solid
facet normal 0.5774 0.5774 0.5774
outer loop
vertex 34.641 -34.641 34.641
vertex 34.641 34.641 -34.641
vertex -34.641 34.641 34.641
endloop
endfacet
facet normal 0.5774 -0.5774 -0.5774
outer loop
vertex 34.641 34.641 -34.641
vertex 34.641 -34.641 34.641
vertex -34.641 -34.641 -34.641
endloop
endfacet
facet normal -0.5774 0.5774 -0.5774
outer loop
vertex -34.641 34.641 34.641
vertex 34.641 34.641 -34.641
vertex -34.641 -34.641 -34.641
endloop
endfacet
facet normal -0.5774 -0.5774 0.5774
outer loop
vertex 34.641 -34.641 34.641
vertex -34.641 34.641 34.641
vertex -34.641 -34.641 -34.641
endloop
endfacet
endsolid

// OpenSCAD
/*
  
   cubic system forms
   
   see http://kitwallace.tumblr.com/tagged/crystal 
   
   Kit Wallace October 2015
   
   doesnt work in Thiniverse customiser - preview is very small 
   
*/

form=5; // [0:cube,1:rhombic dodecahedron,2:tetrahexahedron,3:pentagonal dodecahedron,4:octahedron,5:tetrahedron,6:icositetrahedron,7:triakis tetrahedron,8:triakis octahedron,9:deltoid dodecahedron,10:hexakis octahedron,11:diakisdodecahedron,12:hexatetrahedron,13:pentagonal icositetrahedron,14:tetrahedral pentagonal dodecaheron]



/* [orientation] */
//experimentation needed since size varies with form
size=20; // [1:40] 

// basic functions

function flatten(l) = [ for (a = l) for (b = a) b ] ;

function vcontains(val,list) =
     search([val],list)[0] != [];
       
function distinct(list,dlist=[],i=0) =  // return only distinct items of list
      i==len(list)
         ? dlist
         : vcontains(list[i],dlist)
             ? distinct(list,dlist,i+1)
             : distinct(list,concat(dlist,[list[i]]),i+1)
      ;

function sum(list,i=0) =  
      i < len(list)
        ?  list[i] + sum(list,i+1)
        :  0;

// solid construction
  
module orient_to(centre, normal) {   
      translate(centre)
      rotate([0, 0, atan2(normal.y, normal.x)]) //rotation
      rotate([0, atan2(sqrt(pow(normal.x, 2)+pow(normal.y, 2)),normal.z), 0])
      children();
}

module face(normal, d=1, size=20) {
   orient_to([0,0,0],normal)
       translate([0,0, d + size/2])
            cube([10*size,10*size,size],center=true);
} 

module solid(faces,d=1,color="lightblue",size=5) {
 /* faces is a list of normals (Miller indices)
    d is either a scaler, the distance of each face from the origin or a list of distances, one for each face
 */  
 color(color)
    difference() {
     sphere(size,center=true);
     for(i = [0:len(faces)-1])  {
       face = faces[i];
       fd = len(d) == undef ? d : d[i];
       face(face,d=fd,size=size);
     }
 }
}

// functions to expand a form into faces using eg perms and combs

function perm3(l) =
// lazy until I code general perms with duplicates
 distinct(
   [[l[0],l[1],l[2]],
   [l[0],l[2],l[1]],
   [l[1],l[0],l[2]],
   [l[1],l[2],l[0]],
   [l[2],l[0],l[1]],
   [l[2],l[1],l[0]]
]);
        
function combs(list,n=0) =
   n < len(list)-1
   ? [for (j=list[n])
       for (sl= combs(list,n+1))
           concat(j,sl)
     ]
   : list[n] ;
 
       
function expand(list) =   
// needs a better name
  [for (x= list)
      x== 0 ? 0 : [x,-x]
  ];

// face generators
  
function shift(face,k=1) = [face[k%3],face[(k+1)%3],face[(k+2)%3]];
       
function cycle(face) =
    [face,shift(face,1),shift(face,2)];

function full_symmetry(form) =
   distinct(flatten([for (comb = combs(expand(form))) perm3(comb)]));
  
function tetra_symmetry(form) =
   distinct(flatten([for (face = [form,[form[1],form[0],form[2]]]) combs(expand(face))]));

function gyroid_symmetry(form,even=true) =
    concat(parity_filter(distinct(flatten([for (face = cycle(form)) combs(expand(face))])),even),
           parity_filter(distinct(flatten([for (face = cycle([form[0],form[2],-form[1]])) combs(expand(face))])), ! even)
    );

function opposite(face) =
   [for (a=face) 
       a==0 ? 0 : - a];

function mirror(face) =  [ face,opposite(face)];   

function switch(face) = [face[1],face[0],face[2]];

function trapezohedral_symmetry(form) =
 concat(
    parity_filter(combs(expand(form)),form),
    parity_filter(combs(expand(switch(form))),mirror(form))
    );

// bit of a hack - sb a filter
function rotate_z(form) = [-form[1],form[0],form[2]]; 
   
function rotate_z4(form) = 
   let (mform=[form[0],form[1],-form[2]])
   [form,
    rotate_z(form),
    rotate_z(rotate_z(form)),
    rotate_z(rotate_z(rotate_z(form))),
    mform,
    rotate_z(mform),
    rotate_z(rotate_z(mform)),
    rotate_z(rotate_z(rotate_z(mform))) 
   ];
   
 // filters
           
function parity(face) =
    let(parity = sum( [for (i=face) i > 0 ? 1 : 0]))
    parity % 2 == 0 ;
 
function parity_filter(faces,form) =
    [for (face=faces) if (parity(face) == parity(form) ) face]; 

function unsigned(face) = [abs(face[0]),abs(face[1]),abs(face[2])];

function same_order(form,face) = 
    form == face || form==shift(face) || form==shift(shift(face));

function order_filter(faces,form) =
    [for (face=faces) 
        if (same_order(unsigned(form),unsigned(face))) face
    ];

function hemi_filter(faces,axis,form) =
     let(asign=sign(form[axis]))
     [for (face=faces) 
          if(sign(face[abs(axis)])==asign) face
     ];
          
// face construction      
function filter_faces(form,faces,modifiers,i=0) =
    i < len(modifiers)
       ? let(filter=modifiers[i])
         let(filtered_faces =
             filter=="order"
             ? order_filter(faces,form)
             : filter=="parity" 
             ? parity_filter(faces,form)
             : filter=="hemiz"
             ? hemi_filter(faces,2,form)
             : faces)
         filter_faces(form,filtered_faces,modifiers,i+1)
       : faces;
          
function form_faces(form,base,modifiers) =
    let(base_faces = 
         base=="full" 
       ? full_symmetry(form)
       : base=="tetra" 
       ? tetra_symmetry(form)
       : base=="gyroid"
       ? gyroid_symmetry(form)
       : base=="trapezoid" 
       ? trapezohedral_symmetry(form)
       : base=="mirror"
       ? mirror(form)
       : base=="pedion"
       ? [form]
       : base=="rotate_z4"
       ? rotate_z4(form)
       : [form])
     let(faces = filter_faces(form,base_faces,modifiers) )
     faces;

// crystal rendering
COLORS=["lightpink","lime","aquamarine","khaki","silver","lightsalmon","lightgreen","orange","cadetblue","tan","chartreuse","violet"];

module c_render(crystal) {
    forms=crystal[1];
    intersection_for (i=[0:len(forms)-1]) 
       c_render_part(crystal,i);
}


module c_render_selected(crystal,ds) {
    forms=crystal[1];
    intersection_for (i=[0:len(forms)-1]) {
       if (ds[i] != 0) c_render_part(crystal,i,ds[i]);
           }
}

module c_render_part(crystal,k,ds,label=false) {
    data=crystal[0];
    forms=crystal[1];
    scale(data[1])  
      {
         form_spec=forms[k];     
         form=form_spec[0];
         d = ds==undef ? form_spec[1] : ds;
         base = form_spec[2] == "" || form_spec[2] == undef  ?  data[2] : form_spec[2];
         modifiers=form_spec[3] == undef ? [] : form_spec[3] ;  
         name = form_spec[4] == undef ? "" :   form_spec[4];     
         ci= k % len(COLORS);
         color = COLORS[ci]== undef ? "green" : COLORS[ci];
         faces=form_faces(form,base,modifiers);  
  //       echo(form_spec);
         if(label) color("black") {
             translate([0,0,-3.5]) rotate([45,0,25]) scale(0.05) text(name,halign="center",font="Georgia:style=Regular"   );
             translate([0,0,-4.5]) rotate([45,0,25]) scale(0.05) text(str(form),halign="center",font="Georgia:style=Regular"   );
         }
         echo(name,color,form,d,base,modifiers, len(faces),faces);
         solid(faces,d,color);      
      }  
}

// data
/*
   the data structure has the format:
       [header [form]*]
   header = [name,scale,default_base symmetry,class]
   form =[miller indices, d, base ("" = default_base), [modifiers], name]
   
*/
// Cubic system

cubic_system = [
    ["cubic system",[1,1,1], "full"],
    [
      [[1,0,0],1,"",[],"cube"],
      [[1,1,0],1,"",[],"rhombic dodecahedron"],
      [[1,2,0],1,"",[],"tetrahexahedron"],
      [[1,2,0],1,"",["order"],"pentagonal dodecahedron"],  
      [[1,1,1],1,"",[],"octahedron"],
      [[1,1,1],1,"",["parity"],"tetrahedron"],
      [[2,1,1],1,"",[],"icositetrahedron"],
      [[2,1,1],1,"",["parity"],"triakis tetrahedron"],
      [[2,2,1],1,"",[],"triakis octahedron"],
      [[2,2,1],1,"",["parity"],"deltoid dodecahedron"],
      [[3,2,1],1,"",[],"hexakis octahedron"],
      [[3,2,1],1,"",["order"],"diakisdodecahedron"],
      [[3,2,1],1,"",["parity"], "hexatetrahedron"],
      [[3,2,1],1,"gyroid",[], "pentagonal icositetrahedron"],
      [[3,2,1],1,"",["parity","order"],"tetrahedral pentagonal dodecaheron"]
    ]
];

scale(size)  c_render_part(cubic_system,form);

